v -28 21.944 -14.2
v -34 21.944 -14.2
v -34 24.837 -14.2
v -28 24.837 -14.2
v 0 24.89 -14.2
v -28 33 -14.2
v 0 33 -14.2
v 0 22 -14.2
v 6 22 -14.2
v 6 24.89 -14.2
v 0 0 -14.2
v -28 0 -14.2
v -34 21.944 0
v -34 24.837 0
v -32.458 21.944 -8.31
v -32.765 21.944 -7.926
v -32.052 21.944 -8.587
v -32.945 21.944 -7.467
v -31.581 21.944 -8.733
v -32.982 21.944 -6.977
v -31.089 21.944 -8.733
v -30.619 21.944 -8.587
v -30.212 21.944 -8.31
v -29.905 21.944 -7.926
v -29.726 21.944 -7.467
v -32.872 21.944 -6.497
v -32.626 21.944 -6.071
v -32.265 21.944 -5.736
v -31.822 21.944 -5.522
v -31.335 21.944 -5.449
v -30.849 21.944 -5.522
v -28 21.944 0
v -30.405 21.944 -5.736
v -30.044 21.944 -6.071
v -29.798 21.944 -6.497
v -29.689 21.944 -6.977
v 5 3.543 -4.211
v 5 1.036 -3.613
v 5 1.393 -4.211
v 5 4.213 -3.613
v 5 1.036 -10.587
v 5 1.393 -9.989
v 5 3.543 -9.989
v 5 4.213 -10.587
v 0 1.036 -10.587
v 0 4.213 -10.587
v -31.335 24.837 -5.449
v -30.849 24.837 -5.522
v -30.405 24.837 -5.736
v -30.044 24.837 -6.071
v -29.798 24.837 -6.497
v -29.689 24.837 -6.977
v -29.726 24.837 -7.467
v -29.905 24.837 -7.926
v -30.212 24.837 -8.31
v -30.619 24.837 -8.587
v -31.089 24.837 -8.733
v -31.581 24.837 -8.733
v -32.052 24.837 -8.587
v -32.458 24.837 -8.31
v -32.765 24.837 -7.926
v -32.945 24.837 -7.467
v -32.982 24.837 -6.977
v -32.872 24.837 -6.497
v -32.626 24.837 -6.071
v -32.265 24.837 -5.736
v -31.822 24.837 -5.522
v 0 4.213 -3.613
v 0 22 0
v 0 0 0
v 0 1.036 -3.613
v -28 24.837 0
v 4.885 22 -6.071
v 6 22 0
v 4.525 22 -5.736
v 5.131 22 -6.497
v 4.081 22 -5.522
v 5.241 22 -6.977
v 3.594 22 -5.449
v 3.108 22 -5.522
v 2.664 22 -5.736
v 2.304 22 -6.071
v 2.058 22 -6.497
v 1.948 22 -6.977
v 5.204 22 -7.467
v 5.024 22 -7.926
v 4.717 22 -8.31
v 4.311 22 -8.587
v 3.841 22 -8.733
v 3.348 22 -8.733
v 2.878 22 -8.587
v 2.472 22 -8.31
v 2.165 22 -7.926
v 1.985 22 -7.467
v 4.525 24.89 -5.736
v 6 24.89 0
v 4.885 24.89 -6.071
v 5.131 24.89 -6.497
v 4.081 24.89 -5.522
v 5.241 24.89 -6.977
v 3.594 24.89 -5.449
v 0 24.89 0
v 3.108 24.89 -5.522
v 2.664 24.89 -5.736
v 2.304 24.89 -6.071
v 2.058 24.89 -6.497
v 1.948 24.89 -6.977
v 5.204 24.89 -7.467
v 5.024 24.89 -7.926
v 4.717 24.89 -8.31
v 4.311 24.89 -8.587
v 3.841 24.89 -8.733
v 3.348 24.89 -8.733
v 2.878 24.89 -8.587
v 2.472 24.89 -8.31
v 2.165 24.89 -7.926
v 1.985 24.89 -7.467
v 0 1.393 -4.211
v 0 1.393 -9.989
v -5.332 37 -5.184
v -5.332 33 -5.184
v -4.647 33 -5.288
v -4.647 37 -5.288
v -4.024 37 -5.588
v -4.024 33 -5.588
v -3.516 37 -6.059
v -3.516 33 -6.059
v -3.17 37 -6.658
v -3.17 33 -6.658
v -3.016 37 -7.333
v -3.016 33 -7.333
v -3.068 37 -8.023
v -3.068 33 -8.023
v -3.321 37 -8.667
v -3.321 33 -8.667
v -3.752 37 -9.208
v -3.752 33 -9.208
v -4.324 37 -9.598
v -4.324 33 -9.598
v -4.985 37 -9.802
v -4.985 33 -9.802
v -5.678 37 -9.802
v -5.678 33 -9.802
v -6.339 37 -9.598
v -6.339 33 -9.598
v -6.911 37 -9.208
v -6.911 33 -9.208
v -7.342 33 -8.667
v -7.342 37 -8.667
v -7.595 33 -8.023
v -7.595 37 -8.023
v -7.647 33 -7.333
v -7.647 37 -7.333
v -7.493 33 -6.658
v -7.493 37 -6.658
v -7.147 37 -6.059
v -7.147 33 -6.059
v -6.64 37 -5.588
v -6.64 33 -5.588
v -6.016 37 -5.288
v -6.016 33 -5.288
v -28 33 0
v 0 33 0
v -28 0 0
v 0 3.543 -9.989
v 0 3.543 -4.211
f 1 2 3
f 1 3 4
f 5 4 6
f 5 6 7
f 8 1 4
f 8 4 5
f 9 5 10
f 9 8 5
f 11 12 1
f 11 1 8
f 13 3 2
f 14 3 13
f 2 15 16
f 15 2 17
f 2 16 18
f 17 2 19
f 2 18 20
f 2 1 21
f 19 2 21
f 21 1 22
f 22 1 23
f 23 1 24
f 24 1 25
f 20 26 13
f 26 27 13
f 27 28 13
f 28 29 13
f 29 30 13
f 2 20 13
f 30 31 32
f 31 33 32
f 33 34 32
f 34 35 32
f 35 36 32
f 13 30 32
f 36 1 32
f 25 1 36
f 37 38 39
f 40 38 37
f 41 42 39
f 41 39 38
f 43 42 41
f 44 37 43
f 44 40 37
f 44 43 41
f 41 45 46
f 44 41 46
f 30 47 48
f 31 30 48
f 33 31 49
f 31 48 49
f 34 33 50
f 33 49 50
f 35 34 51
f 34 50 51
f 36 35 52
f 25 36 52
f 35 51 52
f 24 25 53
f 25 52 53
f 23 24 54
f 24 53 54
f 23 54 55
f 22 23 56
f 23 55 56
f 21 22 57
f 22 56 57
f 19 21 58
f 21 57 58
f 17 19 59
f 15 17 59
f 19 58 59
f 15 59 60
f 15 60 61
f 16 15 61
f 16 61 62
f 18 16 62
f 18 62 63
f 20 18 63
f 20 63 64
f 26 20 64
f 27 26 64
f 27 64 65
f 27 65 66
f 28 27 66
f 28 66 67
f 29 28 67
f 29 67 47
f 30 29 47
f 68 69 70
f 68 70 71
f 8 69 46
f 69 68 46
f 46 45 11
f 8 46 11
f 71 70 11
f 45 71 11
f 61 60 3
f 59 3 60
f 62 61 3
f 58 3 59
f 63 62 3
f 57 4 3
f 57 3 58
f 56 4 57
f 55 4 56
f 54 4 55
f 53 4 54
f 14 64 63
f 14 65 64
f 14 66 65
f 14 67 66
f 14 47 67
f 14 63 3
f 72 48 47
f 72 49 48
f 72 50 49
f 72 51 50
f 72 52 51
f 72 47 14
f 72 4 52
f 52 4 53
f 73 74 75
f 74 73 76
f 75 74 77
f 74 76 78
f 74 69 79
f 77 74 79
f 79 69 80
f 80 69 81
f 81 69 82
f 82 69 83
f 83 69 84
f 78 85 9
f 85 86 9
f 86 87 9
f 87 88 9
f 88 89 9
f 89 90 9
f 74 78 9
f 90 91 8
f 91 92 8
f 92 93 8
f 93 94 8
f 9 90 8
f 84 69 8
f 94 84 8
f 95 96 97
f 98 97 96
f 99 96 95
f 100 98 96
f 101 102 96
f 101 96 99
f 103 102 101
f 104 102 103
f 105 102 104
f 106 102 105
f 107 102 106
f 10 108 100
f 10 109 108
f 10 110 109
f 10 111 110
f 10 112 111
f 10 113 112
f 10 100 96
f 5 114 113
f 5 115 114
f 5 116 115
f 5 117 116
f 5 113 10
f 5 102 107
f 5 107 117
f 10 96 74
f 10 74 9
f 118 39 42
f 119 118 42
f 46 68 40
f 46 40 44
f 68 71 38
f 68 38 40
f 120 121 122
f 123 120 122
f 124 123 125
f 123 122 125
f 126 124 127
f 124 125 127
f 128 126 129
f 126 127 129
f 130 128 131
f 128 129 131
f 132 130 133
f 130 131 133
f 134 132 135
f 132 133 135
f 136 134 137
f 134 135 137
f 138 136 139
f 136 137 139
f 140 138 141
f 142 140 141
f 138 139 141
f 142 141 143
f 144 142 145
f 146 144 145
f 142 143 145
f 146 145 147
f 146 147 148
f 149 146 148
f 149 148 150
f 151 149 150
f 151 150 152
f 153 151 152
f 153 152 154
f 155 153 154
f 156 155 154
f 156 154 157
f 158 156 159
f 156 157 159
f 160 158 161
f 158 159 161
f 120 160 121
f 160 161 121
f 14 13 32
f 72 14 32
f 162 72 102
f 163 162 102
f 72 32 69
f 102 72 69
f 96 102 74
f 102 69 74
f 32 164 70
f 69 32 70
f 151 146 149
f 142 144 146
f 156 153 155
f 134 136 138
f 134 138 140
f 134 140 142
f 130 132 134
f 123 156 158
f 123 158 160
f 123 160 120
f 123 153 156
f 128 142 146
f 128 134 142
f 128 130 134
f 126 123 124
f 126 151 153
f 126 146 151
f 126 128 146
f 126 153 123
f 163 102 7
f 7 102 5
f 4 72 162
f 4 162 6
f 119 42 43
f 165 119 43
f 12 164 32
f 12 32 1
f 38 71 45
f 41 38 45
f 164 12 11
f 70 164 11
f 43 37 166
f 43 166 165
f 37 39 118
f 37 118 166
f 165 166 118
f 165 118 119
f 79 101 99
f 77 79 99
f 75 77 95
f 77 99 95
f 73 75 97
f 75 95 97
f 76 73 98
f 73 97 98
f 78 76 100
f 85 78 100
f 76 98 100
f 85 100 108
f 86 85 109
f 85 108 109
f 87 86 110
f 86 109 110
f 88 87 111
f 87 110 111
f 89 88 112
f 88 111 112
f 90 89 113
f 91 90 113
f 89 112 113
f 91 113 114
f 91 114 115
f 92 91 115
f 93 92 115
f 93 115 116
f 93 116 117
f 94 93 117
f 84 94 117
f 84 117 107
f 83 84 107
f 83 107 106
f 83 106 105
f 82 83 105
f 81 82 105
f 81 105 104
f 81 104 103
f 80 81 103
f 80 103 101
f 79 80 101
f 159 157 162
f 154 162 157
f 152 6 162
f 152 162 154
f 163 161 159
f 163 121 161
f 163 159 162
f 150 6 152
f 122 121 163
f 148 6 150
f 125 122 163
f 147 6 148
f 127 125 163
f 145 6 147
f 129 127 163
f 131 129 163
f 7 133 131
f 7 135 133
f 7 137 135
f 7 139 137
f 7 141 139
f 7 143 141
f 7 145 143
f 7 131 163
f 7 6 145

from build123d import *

# Parameters (mm, degrees)
SKETCH1_W           = 28
SKETCH1_H           = 14.2
BOSS_EXTRUDE1_DEPTH = 33
SKETCH2_R           = 2.321908149
BOSS_EXTRUDE3_DEPTH = 4
SKETCH3_W           = 6.974752534
SKETCH3_H           = 3.176308394
BOSS_EXTRUDE4_DEPTH = 5
SKETCH4_W           = 5.77752576
SKETCH4_H           = 2.149777027
CUT_EXTRUDE1_DEPTH  = 5
SKETCH6_W           = 14.2
SKETCH6_H           = 2.892759627
BOSS_EXTRUDE5_DEPTH = 6
SKETCH11_W          = 14.2
SKETCH11_H          = 2.89
BOSS_EXTRUDE6_DEPTH = 6
SKETCH12_R          = 1.651
CUT_EXTRUDE4_DEPTH  = 6
SKETCH17_R          = 1.651
CUT_EXTRUDE5_DEPTH  = 45.435355427


with BuildPart() as part:
    # Sketch1 → Boss-Extrude1 (new body)
    with BuildSketch(Plane(origin=(0, 0, 0), x_dir=(1, 0, 0), z_dir=(0, 1, 0))):
        with Locations((-14, 7.1)):
            Rectangle(SKETCH1_W, SKETCH1_H)
    extrude(amount=BOSS_EXTRUDE1_DEPTH)

    # Sketch2 → Boss-Extrude3 (add)
    with BuildSketch(Plane(origin=(0, 33, 0), x_dir=(1, 0, 0), z_dir=(0, 1, 0))):
        with Locations(Location((-5.331542912, 7.506333926, 0), (0, 0, 270))):
            Circle(SKETCH2_R)
    extrude(amount=BOSS_EXTRUDE3_DEPTH)

    # Sketch3 → Boss-Extrude4 (add)
    with BuildSketch(Plane(origin=(0, 0, 0), x_dir=(0, 0, -1), z_dir=(1, 0, 0))):
        with Locations((7.1, 2.624490745)):
            Rectangle(SKETCH3_W, SKETCH3_H)
    extrude(amount=BOSS_EXTRUDE4_DEPTH)

    # Sketch4 → Cut-Extrude1 (cut)
    with BuildSketch(Plane(origin=(5, 0, 0), x_dir=(0, 0, -1), z_dir=(1, 0, 0))):
        with Locations((7.1, 2.467865933)):
            Rectangle(SKETCH4_W, SKETCH4_H)
    extrude(amount=-CUT_EXTRUDE1_DEPTH, mode=Mode.SUBTRACT)

    # Sketch6 → Boss-Extrude5 (add)
    with BuildSketch(Plane.ZY.offset(28)):
        with Locations((-7.1, 23.390302975)):
            Rectangle(SKETCH6_W, SKETCH6_H)
    extrude(amount=BOSS_EXTRUDE5_DEPTH)

    # Sketch11 → Boss-Extrude6 (add)
    with BuildSketch(Plane(origin=(0, 0, 0), x_dir=(0, 0, -1), z_dir=(1, 0, 0))):
        with Locations((7.1, 23.445)):
            Rectangle(SKETCH11_W, SKETCH11_H)
    extrude(amount=BOSS_EXTRUDE6_DEPTH)

    # Sketch12 → Cut-Extrude4 (cut)
    with BuildSketch(Plane(origin=(0, 24.89, 0), x_dir=(1, 0, 0), z_dir=(0, 1, 0))):
        with Locations(Location((3.594494482, 7.1, 0), (0, 0, 270))):
            Circle(SKETCH12_R)
    extrude(amount=-CUT_EXTRUDE4_DEPTH, mode=Mode.SUBTRACT)

    # Sketch17 → Cut-Extrude5 (cut, through all)
    with BuildSketch(Plane(origin=(0, 24.836682788, 0), x_dir=(1, 0, 0), z_dir=(0, 1, 0))):
        with Locations(Location((-31.335208853, 7.1, 0), (0, 0, 270))):
            Circle(SKETCH17_R)
    extrude(amount=-CUT_EXTRUDE5_DEPTH, mode=Mode.SUBTRACT)


solid = part.part
